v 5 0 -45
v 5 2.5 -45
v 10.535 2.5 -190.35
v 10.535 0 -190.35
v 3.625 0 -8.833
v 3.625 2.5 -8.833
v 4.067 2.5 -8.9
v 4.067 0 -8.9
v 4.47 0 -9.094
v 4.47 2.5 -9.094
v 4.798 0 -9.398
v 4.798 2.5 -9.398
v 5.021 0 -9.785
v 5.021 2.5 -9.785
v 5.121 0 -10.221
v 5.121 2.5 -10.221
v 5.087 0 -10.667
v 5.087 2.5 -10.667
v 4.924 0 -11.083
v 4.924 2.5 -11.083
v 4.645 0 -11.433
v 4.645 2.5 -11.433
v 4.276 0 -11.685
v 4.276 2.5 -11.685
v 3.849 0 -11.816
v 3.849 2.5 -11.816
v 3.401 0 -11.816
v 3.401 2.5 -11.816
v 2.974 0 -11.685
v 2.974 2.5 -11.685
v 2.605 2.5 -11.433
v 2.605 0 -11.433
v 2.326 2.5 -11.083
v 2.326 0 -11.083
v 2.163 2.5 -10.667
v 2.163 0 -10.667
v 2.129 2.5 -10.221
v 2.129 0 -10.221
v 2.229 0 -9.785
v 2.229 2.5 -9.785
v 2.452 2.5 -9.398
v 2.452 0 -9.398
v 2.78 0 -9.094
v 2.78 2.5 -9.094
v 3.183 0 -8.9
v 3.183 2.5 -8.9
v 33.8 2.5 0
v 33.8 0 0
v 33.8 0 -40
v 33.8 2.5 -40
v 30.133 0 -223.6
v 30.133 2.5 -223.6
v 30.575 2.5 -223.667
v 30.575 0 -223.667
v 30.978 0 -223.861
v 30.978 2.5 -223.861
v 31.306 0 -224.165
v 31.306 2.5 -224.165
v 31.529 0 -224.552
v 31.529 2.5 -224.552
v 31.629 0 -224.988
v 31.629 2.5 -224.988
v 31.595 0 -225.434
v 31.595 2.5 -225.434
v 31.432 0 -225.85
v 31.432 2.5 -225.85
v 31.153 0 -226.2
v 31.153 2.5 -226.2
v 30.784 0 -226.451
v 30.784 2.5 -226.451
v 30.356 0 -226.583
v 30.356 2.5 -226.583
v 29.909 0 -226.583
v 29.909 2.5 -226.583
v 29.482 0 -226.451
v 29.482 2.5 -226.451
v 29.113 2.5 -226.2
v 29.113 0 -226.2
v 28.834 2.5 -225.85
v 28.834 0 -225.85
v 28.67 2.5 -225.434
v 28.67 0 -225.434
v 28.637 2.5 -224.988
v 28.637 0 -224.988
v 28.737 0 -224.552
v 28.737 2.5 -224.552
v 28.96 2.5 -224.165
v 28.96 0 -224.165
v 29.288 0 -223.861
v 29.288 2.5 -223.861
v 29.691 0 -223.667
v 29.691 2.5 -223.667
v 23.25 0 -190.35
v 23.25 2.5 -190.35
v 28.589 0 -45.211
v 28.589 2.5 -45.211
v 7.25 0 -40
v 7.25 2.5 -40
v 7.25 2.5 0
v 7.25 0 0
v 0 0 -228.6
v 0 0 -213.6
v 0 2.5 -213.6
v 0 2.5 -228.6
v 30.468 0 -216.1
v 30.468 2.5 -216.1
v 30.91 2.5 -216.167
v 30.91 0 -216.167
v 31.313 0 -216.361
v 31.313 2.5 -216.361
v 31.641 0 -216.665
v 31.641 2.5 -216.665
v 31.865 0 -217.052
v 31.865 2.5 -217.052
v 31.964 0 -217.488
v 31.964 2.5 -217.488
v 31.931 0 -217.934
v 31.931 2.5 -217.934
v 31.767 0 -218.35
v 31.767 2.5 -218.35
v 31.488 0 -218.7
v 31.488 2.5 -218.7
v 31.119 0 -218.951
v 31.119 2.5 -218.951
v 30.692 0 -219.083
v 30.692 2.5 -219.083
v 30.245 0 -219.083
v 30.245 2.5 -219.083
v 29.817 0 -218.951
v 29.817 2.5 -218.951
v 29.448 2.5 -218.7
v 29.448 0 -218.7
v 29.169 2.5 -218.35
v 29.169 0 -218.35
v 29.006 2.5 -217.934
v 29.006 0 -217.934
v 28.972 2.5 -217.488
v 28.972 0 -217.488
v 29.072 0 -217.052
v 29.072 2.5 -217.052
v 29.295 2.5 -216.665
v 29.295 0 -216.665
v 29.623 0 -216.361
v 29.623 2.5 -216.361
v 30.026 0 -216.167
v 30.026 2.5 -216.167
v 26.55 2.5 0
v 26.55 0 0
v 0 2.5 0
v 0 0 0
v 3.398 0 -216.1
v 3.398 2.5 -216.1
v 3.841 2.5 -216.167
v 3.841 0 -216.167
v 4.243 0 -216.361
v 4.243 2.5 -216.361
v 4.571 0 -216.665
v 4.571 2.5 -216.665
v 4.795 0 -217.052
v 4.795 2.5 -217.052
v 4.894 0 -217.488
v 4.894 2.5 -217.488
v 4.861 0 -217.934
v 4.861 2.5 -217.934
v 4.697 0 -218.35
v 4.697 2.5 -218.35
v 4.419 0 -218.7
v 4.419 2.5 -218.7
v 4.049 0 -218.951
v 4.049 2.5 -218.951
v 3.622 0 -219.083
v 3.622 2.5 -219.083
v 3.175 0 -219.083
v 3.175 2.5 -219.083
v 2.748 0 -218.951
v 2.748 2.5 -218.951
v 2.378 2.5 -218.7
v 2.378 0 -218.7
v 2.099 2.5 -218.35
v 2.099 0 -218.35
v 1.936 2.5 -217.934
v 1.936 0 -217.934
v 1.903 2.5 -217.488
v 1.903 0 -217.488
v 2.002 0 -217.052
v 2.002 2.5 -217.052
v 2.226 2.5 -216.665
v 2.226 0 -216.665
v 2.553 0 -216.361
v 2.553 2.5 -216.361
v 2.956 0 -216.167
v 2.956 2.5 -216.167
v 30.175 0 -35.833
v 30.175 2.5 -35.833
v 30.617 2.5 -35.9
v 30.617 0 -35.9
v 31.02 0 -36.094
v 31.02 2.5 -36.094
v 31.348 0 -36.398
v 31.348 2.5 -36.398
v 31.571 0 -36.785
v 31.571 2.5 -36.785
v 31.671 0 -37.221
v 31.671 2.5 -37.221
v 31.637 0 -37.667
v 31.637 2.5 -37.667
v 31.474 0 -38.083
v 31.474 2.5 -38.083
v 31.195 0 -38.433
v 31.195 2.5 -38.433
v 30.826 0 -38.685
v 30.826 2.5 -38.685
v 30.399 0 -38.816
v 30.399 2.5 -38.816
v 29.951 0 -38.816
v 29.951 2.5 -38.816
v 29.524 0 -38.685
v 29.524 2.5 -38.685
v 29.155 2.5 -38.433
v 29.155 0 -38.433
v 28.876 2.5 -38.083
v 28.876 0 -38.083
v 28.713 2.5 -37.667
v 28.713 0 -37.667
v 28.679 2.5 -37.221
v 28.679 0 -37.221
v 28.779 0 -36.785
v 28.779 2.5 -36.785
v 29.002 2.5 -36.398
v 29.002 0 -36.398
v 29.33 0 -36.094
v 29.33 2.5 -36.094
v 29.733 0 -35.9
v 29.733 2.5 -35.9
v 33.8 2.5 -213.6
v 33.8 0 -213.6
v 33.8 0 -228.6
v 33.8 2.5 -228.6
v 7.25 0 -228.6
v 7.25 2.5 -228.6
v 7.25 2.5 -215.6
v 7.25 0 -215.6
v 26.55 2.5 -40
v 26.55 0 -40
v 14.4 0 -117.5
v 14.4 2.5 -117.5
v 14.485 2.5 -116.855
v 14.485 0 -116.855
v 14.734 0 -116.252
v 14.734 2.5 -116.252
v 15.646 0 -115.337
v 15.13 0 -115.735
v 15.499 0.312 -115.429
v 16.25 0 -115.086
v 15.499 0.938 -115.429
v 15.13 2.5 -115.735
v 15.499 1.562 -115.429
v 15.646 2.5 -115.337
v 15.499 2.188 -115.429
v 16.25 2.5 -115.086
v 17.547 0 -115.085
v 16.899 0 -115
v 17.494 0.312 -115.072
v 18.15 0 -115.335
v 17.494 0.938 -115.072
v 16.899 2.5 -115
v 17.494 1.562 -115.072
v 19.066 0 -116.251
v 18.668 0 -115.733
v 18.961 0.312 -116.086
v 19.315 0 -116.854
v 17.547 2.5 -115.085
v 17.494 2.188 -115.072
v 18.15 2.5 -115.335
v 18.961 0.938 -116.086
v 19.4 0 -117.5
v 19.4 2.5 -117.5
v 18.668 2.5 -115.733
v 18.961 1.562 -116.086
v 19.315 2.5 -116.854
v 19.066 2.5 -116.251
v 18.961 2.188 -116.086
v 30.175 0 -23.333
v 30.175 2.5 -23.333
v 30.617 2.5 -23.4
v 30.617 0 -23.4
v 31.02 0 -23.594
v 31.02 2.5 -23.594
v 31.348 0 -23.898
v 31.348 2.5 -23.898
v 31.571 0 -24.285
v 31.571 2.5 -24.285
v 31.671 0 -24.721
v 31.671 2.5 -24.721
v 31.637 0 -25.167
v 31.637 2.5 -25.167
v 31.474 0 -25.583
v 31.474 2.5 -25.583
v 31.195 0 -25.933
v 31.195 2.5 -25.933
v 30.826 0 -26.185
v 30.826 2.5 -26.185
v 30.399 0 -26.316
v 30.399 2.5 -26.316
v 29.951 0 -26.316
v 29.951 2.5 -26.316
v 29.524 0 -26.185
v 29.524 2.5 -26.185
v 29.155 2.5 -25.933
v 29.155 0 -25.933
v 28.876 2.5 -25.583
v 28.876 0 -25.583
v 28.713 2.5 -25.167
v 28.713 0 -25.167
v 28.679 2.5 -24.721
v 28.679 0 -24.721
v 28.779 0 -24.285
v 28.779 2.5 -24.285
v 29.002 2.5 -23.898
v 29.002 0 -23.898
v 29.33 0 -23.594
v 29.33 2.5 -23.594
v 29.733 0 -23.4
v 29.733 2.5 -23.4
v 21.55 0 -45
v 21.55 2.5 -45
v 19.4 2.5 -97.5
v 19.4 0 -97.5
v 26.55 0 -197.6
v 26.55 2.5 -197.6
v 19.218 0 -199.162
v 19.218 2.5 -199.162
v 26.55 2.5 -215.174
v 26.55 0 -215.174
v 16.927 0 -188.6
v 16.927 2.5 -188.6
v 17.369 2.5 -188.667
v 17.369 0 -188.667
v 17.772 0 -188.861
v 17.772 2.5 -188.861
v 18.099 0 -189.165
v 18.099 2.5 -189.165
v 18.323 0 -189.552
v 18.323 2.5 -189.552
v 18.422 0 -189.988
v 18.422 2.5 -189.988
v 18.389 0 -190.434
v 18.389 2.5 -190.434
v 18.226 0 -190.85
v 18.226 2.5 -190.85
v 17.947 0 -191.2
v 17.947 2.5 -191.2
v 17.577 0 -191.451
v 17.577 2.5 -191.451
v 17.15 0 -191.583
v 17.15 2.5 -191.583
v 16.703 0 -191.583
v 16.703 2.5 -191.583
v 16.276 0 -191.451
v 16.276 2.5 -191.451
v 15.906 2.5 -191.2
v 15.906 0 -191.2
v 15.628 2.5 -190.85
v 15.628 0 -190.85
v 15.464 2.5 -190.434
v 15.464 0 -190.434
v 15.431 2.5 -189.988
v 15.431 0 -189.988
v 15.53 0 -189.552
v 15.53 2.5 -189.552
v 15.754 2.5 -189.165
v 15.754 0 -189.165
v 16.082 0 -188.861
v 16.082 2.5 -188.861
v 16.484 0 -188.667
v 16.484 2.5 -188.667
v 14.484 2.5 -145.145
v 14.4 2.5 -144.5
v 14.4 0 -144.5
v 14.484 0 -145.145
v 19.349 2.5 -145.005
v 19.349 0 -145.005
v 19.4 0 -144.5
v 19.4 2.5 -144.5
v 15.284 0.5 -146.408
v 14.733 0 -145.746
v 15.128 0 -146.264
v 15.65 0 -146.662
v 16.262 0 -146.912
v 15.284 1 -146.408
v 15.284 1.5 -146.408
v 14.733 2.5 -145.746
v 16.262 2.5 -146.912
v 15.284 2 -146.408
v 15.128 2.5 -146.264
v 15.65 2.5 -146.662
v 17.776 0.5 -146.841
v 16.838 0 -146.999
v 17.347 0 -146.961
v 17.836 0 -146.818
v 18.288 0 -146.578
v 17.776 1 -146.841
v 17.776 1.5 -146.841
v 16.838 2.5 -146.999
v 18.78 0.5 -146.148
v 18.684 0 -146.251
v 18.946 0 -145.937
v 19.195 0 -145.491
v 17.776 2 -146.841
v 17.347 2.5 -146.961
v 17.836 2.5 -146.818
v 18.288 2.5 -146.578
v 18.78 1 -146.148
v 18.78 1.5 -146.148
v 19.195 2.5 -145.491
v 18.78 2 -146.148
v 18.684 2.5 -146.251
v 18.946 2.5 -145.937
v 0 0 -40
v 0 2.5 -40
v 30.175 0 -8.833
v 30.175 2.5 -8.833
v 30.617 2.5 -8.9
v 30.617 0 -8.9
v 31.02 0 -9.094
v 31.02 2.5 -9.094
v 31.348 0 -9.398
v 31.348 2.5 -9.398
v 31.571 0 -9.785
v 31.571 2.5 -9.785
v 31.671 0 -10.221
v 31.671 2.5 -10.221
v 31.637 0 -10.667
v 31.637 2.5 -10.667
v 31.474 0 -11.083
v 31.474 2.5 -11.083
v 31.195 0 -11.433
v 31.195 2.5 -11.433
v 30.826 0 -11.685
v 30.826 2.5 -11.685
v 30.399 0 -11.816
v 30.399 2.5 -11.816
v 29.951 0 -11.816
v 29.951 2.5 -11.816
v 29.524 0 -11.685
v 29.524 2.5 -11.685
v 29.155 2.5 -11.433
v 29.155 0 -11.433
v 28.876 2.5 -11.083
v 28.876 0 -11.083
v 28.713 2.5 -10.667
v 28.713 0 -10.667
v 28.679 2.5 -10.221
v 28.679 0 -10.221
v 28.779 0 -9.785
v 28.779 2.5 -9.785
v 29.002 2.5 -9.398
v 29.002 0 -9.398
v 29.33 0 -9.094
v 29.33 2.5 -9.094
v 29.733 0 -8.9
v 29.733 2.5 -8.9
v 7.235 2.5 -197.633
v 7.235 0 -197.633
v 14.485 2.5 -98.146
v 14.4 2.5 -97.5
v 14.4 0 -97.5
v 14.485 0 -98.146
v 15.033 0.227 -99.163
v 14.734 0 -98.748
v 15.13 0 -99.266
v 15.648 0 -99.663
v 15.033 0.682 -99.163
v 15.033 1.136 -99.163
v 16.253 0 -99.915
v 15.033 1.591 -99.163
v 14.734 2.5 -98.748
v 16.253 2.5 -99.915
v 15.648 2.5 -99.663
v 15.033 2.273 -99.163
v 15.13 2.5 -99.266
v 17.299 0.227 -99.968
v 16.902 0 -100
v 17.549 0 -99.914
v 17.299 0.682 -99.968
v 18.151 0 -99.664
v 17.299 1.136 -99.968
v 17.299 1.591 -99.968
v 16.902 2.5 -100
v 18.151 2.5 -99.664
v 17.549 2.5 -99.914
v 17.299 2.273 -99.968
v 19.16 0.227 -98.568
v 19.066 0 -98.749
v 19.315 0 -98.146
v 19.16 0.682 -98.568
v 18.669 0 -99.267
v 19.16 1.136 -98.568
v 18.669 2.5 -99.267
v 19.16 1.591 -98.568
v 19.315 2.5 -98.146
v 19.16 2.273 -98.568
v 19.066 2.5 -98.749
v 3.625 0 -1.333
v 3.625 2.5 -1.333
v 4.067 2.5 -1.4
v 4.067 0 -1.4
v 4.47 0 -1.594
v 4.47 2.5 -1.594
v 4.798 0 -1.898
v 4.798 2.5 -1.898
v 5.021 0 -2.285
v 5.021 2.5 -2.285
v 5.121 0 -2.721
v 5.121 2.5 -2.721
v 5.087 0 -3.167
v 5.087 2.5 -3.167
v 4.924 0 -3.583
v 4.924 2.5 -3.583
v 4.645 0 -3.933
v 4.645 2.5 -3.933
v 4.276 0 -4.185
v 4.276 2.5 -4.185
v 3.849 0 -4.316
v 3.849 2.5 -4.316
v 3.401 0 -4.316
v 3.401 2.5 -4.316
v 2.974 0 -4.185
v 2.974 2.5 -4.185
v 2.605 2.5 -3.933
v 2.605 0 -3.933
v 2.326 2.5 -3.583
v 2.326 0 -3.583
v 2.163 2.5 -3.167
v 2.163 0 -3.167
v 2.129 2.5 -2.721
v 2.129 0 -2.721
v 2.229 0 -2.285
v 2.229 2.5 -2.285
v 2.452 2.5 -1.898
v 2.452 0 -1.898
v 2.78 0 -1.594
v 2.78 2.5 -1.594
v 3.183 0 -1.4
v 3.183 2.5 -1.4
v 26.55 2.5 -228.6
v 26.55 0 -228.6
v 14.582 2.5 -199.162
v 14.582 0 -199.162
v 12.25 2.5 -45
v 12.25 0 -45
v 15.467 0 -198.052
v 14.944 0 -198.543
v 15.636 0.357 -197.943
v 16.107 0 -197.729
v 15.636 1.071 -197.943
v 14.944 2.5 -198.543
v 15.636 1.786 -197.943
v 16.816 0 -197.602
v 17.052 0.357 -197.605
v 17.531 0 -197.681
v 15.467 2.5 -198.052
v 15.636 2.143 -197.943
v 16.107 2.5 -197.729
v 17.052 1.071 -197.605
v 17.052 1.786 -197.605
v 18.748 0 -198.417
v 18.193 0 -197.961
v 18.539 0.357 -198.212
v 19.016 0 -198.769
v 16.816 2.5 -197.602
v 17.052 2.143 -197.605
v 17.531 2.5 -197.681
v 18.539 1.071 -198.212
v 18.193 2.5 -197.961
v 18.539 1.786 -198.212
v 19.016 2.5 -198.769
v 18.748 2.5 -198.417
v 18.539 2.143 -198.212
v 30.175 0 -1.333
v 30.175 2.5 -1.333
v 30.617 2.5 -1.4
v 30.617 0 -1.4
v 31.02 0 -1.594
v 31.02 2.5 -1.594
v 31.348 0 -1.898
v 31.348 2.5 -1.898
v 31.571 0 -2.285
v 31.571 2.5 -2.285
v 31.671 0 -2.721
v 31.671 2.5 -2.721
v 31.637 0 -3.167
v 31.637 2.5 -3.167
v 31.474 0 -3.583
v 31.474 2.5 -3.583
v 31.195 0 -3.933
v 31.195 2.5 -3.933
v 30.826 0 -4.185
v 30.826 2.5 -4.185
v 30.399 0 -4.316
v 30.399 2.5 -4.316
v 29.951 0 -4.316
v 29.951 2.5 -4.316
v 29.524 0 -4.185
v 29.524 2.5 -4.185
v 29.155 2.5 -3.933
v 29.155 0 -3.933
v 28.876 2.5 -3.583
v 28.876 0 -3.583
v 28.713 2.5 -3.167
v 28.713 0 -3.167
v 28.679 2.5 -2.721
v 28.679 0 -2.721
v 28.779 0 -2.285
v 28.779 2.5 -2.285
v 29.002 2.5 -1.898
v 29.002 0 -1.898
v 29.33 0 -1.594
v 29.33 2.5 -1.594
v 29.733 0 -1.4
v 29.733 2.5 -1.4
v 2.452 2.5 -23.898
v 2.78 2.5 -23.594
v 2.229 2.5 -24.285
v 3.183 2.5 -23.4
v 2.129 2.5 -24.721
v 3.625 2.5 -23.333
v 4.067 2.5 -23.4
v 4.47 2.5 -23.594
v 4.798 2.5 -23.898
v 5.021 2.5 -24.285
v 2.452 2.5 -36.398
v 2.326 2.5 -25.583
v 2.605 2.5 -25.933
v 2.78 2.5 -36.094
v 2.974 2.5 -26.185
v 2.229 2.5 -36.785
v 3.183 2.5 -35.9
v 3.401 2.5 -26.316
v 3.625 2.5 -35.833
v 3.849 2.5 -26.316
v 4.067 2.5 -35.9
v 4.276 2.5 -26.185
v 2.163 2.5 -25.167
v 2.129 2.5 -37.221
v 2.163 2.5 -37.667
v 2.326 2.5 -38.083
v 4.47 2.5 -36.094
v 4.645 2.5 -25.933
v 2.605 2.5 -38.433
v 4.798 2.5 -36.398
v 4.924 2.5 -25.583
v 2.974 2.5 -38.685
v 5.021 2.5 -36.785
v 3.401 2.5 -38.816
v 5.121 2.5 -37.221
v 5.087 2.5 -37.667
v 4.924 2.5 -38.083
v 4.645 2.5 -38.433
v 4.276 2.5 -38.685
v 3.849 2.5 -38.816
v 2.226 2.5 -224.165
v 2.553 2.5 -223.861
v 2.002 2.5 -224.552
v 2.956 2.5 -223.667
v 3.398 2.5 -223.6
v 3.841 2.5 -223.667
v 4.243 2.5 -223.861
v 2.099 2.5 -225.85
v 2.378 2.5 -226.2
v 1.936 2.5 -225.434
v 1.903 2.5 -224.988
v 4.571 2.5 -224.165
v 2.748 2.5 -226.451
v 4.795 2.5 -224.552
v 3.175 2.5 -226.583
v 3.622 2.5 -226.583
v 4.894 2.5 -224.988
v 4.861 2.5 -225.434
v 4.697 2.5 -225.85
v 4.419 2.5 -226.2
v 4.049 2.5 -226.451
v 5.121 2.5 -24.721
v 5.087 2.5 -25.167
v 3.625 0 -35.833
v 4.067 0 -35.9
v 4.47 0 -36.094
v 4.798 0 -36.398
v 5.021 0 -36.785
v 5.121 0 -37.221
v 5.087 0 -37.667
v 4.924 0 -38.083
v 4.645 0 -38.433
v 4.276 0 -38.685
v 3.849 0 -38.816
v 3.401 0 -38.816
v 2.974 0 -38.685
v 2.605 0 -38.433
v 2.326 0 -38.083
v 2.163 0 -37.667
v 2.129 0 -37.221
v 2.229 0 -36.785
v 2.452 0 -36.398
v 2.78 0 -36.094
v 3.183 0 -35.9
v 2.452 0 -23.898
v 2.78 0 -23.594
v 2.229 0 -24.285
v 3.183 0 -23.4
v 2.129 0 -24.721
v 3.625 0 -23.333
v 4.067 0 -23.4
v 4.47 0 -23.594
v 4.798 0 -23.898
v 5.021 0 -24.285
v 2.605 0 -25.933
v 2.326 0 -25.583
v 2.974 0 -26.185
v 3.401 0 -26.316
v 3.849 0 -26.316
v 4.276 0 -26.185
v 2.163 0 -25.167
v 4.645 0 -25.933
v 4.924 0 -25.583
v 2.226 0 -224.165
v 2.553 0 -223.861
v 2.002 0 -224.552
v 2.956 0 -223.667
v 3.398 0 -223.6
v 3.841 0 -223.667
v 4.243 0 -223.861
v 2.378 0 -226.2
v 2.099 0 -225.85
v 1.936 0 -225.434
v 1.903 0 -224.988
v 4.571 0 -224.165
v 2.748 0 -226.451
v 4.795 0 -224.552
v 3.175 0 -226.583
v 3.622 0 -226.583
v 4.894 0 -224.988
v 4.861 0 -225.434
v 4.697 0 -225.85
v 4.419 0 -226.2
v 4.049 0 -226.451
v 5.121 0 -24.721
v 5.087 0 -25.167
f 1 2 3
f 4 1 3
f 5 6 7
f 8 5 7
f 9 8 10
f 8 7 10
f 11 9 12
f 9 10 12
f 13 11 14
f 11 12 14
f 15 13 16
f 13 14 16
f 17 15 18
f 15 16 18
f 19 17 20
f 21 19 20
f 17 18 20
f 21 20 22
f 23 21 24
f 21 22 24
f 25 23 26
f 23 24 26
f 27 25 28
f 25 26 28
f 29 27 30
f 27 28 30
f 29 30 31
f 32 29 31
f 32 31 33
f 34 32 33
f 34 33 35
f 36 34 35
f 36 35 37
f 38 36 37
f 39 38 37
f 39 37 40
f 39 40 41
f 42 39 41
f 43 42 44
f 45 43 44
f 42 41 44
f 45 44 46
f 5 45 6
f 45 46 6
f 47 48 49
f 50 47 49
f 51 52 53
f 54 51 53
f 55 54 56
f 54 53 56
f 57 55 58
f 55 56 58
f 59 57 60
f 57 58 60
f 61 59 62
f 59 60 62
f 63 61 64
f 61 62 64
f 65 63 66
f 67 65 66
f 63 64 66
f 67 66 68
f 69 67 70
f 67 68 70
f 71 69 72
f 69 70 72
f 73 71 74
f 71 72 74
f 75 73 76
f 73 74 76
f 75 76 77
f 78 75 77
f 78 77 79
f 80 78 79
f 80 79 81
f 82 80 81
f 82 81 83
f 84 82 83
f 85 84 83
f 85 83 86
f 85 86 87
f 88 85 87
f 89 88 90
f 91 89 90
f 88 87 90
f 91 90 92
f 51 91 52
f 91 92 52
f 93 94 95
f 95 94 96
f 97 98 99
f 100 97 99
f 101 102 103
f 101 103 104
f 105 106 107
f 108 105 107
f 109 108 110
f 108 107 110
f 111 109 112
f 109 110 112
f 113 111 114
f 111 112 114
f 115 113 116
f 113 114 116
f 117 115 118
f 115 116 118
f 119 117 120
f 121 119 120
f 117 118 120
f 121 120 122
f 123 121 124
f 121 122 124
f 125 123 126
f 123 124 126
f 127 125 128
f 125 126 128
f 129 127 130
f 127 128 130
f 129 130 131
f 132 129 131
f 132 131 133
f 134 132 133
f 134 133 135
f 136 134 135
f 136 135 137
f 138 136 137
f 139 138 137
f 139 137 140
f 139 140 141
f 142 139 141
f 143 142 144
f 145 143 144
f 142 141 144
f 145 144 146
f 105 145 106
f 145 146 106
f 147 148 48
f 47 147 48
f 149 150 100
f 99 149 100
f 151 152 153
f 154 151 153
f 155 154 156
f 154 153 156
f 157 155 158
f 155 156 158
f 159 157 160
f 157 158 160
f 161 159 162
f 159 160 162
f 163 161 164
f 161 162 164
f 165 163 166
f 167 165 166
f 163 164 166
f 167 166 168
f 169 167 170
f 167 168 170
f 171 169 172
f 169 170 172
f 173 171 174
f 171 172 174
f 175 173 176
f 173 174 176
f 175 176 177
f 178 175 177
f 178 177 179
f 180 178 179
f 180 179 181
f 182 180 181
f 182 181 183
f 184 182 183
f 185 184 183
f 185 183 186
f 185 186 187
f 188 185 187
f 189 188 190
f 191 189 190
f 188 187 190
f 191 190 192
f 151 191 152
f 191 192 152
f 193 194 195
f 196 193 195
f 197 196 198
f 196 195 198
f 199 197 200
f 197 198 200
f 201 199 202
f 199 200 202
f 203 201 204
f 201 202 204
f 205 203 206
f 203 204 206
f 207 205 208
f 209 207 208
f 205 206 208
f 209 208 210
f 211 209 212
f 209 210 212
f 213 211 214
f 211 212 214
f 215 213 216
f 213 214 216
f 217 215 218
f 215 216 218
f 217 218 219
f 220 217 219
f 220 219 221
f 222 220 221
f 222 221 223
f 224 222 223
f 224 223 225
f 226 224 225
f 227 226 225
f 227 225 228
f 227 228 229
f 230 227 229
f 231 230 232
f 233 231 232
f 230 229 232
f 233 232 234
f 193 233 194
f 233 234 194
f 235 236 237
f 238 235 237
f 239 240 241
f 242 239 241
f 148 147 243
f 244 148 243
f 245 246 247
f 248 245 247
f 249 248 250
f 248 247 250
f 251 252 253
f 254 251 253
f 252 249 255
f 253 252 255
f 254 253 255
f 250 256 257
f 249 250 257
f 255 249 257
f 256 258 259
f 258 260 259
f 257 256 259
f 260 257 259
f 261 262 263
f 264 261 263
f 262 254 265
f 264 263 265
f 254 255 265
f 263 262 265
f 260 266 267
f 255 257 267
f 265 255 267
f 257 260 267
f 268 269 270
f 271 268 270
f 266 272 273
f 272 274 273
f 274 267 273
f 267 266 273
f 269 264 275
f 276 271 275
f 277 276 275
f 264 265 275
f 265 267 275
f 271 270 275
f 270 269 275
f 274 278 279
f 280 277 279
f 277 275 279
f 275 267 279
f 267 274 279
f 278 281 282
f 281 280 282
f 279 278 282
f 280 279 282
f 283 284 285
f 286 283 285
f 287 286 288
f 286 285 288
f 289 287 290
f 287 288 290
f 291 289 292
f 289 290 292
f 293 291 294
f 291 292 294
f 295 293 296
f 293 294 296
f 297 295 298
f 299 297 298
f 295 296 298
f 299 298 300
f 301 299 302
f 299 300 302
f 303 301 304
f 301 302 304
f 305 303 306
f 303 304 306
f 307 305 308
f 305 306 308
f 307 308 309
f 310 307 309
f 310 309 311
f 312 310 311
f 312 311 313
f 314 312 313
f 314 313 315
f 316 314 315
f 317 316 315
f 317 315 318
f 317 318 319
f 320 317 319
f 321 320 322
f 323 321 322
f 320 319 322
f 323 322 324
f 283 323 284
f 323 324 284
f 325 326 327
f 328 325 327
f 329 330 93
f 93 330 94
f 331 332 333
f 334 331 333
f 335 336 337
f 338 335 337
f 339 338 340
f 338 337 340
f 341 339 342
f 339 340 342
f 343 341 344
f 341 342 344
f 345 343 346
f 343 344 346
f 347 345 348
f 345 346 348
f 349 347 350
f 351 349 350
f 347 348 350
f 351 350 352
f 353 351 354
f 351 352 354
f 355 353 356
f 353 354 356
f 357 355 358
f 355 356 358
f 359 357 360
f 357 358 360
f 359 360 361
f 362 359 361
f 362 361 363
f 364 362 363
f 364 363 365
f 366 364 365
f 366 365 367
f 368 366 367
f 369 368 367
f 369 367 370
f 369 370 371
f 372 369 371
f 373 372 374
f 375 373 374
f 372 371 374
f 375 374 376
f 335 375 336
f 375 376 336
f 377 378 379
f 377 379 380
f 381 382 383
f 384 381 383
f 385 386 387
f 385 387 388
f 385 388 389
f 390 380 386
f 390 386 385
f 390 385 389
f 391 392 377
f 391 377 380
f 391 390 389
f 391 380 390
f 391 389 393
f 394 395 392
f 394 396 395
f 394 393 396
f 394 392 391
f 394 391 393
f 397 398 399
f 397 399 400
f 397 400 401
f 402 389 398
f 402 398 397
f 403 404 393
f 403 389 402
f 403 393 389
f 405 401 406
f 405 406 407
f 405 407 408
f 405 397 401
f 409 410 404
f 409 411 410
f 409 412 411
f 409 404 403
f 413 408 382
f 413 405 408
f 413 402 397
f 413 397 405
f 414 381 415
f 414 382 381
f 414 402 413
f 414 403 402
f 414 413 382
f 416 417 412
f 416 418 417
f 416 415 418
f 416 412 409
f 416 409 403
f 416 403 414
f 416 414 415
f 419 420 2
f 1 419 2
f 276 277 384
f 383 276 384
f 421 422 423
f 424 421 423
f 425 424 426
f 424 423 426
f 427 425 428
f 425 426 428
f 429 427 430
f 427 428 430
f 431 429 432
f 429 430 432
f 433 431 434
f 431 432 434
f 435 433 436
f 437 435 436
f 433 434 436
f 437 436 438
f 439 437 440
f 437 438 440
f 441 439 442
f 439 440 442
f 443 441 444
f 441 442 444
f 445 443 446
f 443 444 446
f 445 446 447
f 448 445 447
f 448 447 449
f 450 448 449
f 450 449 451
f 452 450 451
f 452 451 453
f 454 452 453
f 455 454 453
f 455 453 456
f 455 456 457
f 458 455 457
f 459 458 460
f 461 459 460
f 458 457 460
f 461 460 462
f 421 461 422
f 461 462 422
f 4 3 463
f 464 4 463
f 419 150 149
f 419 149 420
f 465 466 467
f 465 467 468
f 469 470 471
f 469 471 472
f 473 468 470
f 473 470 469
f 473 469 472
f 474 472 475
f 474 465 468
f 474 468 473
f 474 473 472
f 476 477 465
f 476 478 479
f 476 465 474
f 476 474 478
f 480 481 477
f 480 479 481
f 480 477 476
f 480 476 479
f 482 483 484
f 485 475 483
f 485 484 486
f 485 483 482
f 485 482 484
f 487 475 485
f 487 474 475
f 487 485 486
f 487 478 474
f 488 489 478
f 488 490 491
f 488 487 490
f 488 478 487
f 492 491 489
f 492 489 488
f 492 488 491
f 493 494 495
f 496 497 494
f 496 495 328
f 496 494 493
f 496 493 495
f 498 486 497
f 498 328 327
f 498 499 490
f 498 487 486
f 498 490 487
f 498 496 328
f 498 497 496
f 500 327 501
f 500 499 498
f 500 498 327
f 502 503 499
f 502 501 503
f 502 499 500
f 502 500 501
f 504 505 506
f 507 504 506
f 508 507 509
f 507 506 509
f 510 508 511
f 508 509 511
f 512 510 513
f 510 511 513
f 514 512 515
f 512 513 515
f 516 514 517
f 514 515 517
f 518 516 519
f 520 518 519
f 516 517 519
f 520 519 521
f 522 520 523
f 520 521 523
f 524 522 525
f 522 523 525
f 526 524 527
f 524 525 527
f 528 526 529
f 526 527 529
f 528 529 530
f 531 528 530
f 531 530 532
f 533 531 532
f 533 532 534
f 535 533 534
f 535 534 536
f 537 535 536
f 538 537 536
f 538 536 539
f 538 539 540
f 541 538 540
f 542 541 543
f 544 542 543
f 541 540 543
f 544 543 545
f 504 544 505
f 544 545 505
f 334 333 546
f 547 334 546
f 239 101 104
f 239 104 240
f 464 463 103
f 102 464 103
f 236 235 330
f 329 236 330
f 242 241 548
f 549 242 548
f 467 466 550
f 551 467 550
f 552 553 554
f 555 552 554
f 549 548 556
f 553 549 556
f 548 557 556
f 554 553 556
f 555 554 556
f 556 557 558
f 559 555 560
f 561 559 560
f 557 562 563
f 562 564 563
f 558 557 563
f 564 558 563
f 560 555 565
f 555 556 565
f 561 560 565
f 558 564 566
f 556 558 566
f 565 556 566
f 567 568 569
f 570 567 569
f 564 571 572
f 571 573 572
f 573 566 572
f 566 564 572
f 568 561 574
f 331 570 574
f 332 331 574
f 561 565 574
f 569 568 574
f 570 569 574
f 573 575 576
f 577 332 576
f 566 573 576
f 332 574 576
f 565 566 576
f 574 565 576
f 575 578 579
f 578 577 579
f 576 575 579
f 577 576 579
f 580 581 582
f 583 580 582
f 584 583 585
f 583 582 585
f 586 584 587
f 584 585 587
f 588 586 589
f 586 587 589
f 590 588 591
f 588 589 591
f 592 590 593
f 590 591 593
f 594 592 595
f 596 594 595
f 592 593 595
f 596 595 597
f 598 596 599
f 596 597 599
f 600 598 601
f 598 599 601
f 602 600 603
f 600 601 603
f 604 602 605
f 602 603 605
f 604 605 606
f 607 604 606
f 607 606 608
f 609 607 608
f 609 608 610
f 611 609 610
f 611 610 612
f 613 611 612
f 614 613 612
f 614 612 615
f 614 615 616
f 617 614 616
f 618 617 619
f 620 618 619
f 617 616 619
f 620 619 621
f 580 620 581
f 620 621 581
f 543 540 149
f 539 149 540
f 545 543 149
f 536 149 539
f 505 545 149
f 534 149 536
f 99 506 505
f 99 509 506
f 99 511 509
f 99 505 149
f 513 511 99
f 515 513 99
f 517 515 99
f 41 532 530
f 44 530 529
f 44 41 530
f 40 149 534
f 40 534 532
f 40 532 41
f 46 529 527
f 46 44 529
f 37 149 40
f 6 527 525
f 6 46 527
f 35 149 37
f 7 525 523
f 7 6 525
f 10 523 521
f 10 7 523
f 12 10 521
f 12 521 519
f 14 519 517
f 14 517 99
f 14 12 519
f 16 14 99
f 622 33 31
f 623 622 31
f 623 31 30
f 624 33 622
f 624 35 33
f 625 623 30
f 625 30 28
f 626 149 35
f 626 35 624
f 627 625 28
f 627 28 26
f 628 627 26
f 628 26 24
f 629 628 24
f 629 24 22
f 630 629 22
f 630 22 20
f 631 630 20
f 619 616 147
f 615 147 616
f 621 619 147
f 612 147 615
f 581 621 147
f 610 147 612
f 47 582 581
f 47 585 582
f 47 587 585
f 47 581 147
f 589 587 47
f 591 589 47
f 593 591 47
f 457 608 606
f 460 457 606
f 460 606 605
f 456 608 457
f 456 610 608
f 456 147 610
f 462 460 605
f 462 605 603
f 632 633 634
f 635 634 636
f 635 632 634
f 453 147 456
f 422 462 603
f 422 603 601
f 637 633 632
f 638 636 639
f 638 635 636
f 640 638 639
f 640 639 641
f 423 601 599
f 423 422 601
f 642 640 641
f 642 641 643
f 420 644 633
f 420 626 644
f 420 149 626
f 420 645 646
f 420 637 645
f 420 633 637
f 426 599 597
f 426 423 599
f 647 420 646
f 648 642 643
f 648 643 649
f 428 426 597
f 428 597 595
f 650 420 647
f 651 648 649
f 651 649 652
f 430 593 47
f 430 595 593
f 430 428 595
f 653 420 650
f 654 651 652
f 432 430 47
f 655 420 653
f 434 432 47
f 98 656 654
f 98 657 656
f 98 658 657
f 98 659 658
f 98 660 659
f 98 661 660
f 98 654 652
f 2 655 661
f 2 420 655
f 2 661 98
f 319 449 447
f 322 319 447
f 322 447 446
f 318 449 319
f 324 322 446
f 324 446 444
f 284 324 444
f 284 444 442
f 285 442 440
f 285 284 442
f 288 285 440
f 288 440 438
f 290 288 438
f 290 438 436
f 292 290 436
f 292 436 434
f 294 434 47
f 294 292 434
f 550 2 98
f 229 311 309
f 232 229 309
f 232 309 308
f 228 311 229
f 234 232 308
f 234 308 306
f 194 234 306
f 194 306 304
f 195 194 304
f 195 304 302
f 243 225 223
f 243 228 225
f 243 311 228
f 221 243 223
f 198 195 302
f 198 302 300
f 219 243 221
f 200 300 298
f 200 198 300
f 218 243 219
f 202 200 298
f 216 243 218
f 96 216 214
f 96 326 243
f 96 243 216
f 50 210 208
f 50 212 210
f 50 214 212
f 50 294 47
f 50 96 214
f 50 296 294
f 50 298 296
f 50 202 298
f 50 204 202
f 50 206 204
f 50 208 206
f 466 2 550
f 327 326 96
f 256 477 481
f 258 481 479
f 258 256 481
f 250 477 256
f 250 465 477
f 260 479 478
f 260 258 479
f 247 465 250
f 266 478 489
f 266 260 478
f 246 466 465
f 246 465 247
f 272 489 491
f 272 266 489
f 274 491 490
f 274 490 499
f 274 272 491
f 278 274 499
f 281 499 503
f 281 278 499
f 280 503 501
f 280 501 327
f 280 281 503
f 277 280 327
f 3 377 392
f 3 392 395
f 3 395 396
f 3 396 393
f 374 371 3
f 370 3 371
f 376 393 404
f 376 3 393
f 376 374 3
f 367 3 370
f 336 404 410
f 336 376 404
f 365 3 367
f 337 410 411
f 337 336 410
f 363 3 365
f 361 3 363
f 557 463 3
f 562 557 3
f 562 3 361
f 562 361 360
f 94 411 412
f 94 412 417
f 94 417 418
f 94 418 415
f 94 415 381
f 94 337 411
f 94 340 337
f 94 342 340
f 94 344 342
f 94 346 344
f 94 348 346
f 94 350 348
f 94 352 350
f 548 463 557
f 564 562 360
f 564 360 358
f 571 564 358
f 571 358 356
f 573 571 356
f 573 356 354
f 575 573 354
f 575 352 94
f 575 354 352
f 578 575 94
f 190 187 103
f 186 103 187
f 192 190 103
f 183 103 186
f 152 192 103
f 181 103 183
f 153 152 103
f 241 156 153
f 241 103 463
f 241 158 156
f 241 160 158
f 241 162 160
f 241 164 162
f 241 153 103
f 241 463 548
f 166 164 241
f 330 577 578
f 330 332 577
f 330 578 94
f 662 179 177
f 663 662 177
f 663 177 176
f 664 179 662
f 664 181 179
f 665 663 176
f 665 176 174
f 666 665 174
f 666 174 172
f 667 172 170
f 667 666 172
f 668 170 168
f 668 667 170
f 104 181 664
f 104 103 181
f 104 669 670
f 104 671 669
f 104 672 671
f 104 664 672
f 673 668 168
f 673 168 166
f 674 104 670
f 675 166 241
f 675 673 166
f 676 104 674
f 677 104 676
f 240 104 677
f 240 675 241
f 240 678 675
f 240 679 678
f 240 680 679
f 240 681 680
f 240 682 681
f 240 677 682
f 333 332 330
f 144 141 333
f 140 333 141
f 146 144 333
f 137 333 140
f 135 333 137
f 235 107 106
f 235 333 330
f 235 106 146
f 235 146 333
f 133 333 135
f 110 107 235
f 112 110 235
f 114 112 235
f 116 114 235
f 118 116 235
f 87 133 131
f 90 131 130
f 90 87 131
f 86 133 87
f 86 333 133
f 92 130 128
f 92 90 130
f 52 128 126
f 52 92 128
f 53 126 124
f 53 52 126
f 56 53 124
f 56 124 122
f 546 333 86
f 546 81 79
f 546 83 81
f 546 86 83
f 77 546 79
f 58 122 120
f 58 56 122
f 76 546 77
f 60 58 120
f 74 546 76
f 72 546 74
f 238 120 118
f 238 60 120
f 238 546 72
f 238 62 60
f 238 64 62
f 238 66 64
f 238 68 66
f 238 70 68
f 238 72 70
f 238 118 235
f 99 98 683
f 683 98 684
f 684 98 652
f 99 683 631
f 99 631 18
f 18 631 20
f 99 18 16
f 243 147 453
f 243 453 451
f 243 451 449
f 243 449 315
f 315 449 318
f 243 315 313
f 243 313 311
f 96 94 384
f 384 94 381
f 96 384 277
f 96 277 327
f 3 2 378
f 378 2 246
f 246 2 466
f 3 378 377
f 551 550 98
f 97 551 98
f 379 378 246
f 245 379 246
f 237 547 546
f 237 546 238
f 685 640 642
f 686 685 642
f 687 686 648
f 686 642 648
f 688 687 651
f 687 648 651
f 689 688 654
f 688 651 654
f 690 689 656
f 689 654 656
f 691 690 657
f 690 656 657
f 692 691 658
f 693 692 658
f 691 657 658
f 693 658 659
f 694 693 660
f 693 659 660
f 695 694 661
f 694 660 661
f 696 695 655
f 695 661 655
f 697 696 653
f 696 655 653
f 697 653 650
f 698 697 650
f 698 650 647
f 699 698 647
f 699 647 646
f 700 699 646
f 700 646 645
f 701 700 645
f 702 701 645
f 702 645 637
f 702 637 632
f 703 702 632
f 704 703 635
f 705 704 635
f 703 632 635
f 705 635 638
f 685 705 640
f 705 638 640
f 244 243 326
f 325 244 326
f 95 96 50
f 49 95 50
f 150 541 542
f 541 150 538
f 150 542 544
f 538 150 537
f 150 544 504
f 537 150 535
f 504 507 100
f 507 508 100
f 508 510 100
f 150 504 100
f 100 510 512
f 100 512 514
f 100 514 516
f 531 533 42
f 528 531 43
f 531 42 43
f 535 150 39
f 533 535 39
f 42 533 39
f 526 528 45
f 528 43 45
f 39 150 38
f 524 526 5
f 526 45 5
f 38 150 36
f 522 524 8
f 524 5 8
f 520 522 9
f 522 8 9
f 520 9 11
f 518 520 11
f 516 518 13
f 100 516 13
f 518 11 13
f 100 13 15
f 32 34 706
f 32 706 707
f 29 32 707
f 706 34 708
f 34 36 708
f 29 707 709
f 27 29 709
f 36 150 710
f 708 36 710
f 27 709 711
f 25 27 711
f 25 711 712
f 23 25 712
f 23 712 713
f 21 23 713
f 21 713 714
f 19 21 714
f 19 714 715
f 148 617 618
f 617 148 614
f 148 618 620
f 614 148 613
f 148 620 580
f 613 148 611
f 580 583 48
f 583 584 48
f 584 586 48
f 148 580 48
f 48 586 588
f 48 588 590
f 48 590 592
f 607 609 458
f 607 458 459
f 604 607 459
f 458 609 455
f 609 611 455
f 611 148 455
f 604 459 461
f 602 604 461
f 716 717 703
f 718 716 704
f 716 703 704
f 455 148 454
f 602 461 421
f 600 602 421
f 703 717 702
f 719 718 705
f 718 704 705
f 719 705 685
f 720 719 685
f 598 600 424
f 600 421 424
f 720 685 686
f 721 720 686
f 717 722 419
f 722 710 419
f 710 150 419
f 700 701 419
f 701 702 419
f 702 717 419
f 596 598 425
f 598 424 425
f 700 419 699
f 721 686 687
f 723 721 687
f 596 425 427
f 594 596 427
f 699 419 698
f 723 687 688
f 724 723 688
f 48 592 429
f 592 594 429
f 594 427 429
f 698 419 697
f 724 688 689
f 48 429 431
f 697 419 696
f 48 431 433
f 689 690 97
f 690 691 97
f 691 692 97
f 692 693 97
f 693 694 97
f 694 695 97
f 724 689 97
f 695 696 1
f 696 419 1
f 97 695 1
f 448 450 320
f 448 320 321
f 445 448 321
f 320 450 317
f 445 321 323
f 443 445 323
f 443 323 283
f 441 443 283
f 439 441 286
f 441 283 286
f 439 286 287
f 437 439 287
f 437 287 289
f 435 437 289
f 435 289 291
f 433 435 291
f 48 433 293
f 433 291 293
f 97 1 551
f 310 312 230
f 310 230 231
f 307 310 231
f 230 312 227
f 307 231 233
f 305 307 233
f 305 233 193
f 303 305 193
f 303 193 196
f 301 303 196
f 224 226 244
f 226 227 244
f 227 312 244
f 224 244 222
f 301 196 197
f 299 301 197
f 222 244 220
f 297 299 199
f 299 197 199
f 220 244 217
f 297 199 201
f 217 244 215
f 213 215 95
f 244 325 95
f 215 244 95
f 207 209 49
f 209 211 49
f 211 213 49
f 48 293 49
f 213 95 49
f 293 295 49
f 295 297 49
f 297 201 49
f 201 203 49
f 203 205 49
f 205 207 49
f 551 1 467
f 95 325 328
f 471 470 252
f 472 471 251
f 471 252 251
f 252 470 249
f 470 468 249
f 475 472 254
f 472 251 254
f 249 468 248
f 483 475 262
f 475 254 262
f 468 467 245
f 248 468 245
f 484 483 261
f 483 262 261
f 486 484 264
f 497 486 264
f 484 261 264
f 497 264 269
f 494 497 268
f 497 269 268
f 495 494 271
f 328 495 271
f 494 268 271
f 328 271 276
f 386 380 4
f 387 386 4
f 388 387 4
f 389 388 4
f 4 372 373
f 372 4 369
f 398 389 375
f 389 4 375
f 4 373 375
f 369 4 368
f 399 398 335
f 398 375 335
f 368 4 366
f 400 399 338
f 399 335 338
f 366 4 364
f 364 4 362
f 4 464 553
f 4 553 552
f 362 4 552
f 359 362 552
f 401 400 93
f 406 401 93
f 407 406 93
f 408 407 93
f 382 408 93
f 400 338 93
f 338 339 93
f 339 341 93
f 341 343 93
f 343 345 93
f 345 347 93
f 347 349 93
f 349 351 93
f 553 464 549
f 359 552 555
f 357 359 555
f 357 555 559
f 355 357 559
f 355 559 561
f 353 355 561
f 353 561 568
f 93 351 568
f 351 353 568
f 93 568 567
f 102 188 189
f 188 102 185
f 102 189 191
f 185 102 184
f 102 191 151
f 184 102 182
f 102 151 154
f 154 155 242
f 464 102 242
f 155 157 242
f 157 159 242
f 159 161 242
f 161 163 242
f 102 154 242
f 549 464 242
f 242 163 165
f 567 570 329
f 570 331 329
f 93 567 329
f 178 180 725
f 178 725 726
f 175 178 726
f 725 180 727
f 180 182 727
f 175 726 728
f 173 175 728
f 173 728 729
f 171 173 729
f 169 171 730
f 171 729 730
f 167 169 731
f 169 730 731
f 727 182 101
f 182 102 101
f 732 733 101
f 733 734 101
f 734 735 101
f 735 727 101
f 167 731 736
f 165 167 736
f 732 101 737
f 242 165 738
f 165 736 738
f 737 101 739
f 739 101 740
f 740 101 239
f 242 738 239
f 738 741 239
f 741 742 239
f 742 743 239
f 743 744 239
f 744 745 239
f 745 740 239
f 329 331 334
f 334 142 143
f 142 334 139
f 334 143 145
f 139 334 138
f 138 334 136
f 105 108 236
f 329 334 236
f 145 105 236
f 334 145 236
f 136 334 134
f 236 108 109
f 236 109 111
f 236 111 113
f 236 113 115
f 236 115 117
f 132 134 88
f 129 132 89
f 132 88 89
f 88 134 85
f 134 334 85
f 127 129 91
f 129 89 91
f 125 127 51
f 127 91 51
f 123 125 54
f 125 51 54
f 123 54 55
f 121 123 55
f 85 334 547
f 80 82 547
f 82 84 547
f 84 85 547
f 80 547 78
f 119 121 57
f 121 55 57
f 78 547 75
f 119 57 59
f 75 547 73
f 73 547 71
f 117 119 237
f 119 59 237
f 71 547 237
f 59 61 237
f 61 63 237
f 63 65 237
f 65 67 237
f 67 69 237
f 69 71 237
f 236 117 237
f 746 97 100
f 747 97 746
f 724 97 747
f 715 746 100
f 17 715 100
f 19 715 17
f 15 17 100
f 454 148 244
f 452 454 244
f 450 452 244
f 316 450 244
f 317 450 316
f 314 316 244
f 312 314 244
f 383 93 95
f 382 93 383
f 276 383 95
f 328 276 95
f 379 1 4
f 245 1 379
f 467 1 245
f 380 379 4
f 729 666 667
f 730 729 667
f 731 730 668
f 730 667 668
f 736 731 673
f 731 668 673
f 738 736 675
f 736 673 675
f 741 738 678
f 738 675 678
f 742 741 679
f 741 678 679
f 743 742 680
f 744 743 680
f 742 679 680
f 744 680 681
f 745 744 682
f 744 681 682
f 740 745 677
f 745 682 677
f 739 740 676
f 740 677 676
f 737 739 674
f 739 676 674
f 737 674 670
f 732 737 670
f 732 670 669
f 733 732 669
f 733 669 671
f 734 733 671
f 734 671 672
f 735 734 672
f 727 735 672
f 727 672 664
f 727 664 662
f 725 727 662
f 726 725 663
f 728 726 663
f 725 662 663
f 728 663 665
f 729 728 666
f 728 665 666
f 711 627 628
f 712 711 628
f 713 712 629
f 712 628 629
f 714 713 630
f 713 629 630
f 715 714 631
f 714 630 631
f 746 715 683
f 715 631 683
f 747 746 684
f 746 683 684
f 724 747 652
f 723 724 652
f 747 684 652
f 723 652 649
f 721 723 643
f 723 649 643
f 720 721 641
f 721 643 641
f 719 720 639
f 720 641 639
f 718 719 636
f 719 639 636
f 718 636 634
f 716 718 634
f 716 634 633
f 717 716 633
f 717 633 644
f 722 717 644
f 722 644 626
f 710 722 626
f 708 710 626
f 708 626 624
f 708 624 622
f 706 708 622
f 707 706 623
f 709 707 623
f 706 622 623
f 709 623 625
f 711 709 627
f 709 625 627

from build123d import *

# Parameters (mm, degrees)
SKETCH1_W           = 33.8
SKETCH1_H           = 228.6
BOSS_EXTRUDE1_DEPTH = 2.5
CUT_EXTRUDE1_DEPTH  = 2.5
SKETCH2_6_OUTSIDE_W = 82.02
SKETCH2_6_OUTSIDE_H = 276.82
CUT_EXTRUDE2_DEPTH  = 2.5
SKETCH5_R           = 1.5
CUT_EXTRUDE3_DEPTH  = 2.5


with BuildPart() as part:
    # Sketch1 → Boss-Extrude1 (new body)
    with BuildSketch(Plane(origin=(0, 0, 0), x_dir=(1, 0, 0), z_dir=(0, 1, 0))):
        with Locations((16.9, 114.3)):
            Rectangle(SKETCH1_W, SKETCH1_H)
    extrude(amount=BOSS_EXTRUDE1_DEPTH)

    # Sketch2 → Cut-Extrude1 (cut)
    with BuildSketch(Plane(origin=(0, 2.5, 0), x_dir=(1, 0, 0), z_dir=(0, 1, 0))):
        with BuildLine():
            Line((14.4, 144.5), (14.4, 117.5))
            add(Edge.make_bspline(
                [(14.4, 117.5), (14.399430285, 117.132237239), (14.536831695, 116.524171276), (14.991581605, 115.839645543), (15.586717627, 115.318158312), (16.441592425, 114.966926324), (17.439533495, 114.99714129), (18.330206262, 115.381489106), (19.143348717, 116.172968782), (19.401576387, 116.99766646), (19.4, 117.5)],
                knots=[0, 0, 0, 0, 0.141327045, 0.23205331, 0.31123598, 0.442337735, 0.576355834, 0.682960692, 0.808345553, 1, 1, 1, 1], degree=3))
            Line((19.4, 117.5), (19.4, 144.5))
            add(Edge.make_bspline(
                [(14.4, 144.5), (14.395253504, 145.223790204), (14.991433849, 146.512706872), (16.62609513, 147.107640812), (17.903590827, 146.872098871), (19.022537404, 146.103569848), (19.403497366, 145.098391499), (19.4, 144.5)],
                knots=[0, 0, 0, 0, 0.27696704, 0.498348678, 0.612918932, 0.769853345, 1, 1, 1, 1], degree=3))
        make_face()
    extrude(amount=-CUT_EXTRUDE1_DEPTH, mode=Mode.SUBTRACT)

    # Sketch2<6> outside → Cut-Extrude2 (cut)
    with BuildSketch(Plane(origin=(0, 2.5, 0), x_dir=(1, 0, 0), z_dir=(0, 1, 0))):
        with Locations((16.9, 114.3)):
            Rectangle(SKETCH2_6_OUTSIDE_W, SKETCH2_6_OUTSIDE_H)
        with BuildLine():
            Line((0, 228.6), (7.25, 228.6))
            Line((7.25, 228.6), (7.25, 215.6))
            Line((7.25, 215.6), (14.582490059, 199.162371251))
            add(Edge.make_bspline(
                [(14.582490059, 199.162371251), (14.711561898, 198.842062842), (15.023836131, 198.378588046), (15.614972661, 197.928802428), (16.251883656, 197.646972571), (17.023429753, 197.553241488), (17.859761798, 197.743006401), (18.671860535, 198.240651313), (19.070795177, 198.798035014), (19.217509941, 199.162371251)],
                knots=[0, 0, 0, 0, 0.175078363, 0.276949723, 0.373162948, 0.525807757, 0.662070379, 0.801161333, 1, 1, 1, 1], degree=3))
            Line((19.217509941, 199.162371251), (26.55, 215.173869546))
            Line((26.55, 215.173869546), (26.55, 228.6))
            Line((26.55, 228.6), (33.8, 228.6))
            Line((33.8, 228.6), (33.8, 213.6))
            Line((33.8, 213.6), (26.55, 197.6))
            Line((26.55, 197.6), (23.25, 190.35))
            Line((23.25, 190.35), (28.588836909, 45.211163091))
            Line((28.588836909, 45.211163091), (33.8, 40))
            Line((33.8, 40), (33.8, 0))
            Line((33.8, 0), (26.55, 0))
            Line((26.55, 0), (26.55, 40))
            Line((26.55, 40), (21.55, 45))
            Line((21.55, 45), (19.4, 97.5))
            add(Edge.make_bspline(
                [(14.4, 97.5), (14.39963006, 97.808675141), (14.484997073, 98.261085854), (14.753428782, 98.807348646), (15.054139544, 99.215057311), (15.586652418, 99.681982141), (16.380265598, 100.007326678), (17.208278255, 100.01514461), (17.857989388, 99.833449339), (18.395045275, 99.537224279), (18.85030775, 99.106523366), (19.272621439, 98.433524922), (19.400681372, 97.867995006), (19.4, 97.5)],
                knots=[0, 0, 0, 0, 0.118087348, 0.173138637, 0.232058356, 0.311090992, 0.441944339, 0.550747407, 0.622172143, 0.698428615, 0.783497697, 0.859367045, 1, 1, 1, 1], degree=3))
            Line((14.4, 97.5), (12.25, 45))
            Line((12.25, 45), (7.25, 40))
            Line((7.25, 40), (7.25, 0))
            Line((7.25, 0), (0, 0))
            Line((0, 0), (0, 40))
            Line((0, 40), (5, 45))
            Line((5, 45), (10.53515625, 190.35))
            Line((10.53515625, 190.35), (7.23515625, 197.632758621))
            Line((7.23515625, 197.632758621), (0, 213.6))
            Line((0, 213.6), (0, 228.6))
        make_face(mode=Mode.SUBTRACT)
    extrude(amount=-CUT_EXTRUDE2_DEPTH, mode=Mode.SUBTRACT)

    # Sketch5 → Cut-Extrude3 (cut)
    with BuildSketch(Plane(origin=(0, 2.5, 0), x_dir=(1, 0, 0), z_dir=(0, 1, 0))):
        with Locations((3.398371539, 225.1)):
            Circle(SKETCH5_R)
        with Locations((3.398371539, 217.6)):
            Circle(SKETCH5_R)
        with Locations((30.132823035, 225.1)):
            Circle(SKETCH5_R)
        with Locations((30.468201459, 217.6)):
            Circle(SKETCH5_R)
        with Locations((3.625, 2.833121102)):
            Circle(SKETCH5_R)
        with Locations((30.175, 2.833121102)):
            Circle(SKETCH5_R)
        with Locations((3.625, 10.333121102)):
            Circle(SKETCH5_R)
        with Locations((3.625, 24.833121102)):
            Circle(SKETCH5_R)
        with Locations((3.625, 37.333121102)):
            Circle(SKETCH5_R)
        with Locations((30.175, 10.333121102)):
            Circle(SKETCH5_R)
        with Locations((30.175, 24.833121102)):
            Circle(SKETCH5_R)
        with Locations((30.175, 37.333121102)):
            Circle(SKETCH5_R)
        with Locations((16.926550078, 190.1)):
            Circle(SKETCH5_R)
    extrude(amount=-CUT_EXTRUDE3_DEPTH, mode=Mode.SUBTRACT)


solid = part.part
